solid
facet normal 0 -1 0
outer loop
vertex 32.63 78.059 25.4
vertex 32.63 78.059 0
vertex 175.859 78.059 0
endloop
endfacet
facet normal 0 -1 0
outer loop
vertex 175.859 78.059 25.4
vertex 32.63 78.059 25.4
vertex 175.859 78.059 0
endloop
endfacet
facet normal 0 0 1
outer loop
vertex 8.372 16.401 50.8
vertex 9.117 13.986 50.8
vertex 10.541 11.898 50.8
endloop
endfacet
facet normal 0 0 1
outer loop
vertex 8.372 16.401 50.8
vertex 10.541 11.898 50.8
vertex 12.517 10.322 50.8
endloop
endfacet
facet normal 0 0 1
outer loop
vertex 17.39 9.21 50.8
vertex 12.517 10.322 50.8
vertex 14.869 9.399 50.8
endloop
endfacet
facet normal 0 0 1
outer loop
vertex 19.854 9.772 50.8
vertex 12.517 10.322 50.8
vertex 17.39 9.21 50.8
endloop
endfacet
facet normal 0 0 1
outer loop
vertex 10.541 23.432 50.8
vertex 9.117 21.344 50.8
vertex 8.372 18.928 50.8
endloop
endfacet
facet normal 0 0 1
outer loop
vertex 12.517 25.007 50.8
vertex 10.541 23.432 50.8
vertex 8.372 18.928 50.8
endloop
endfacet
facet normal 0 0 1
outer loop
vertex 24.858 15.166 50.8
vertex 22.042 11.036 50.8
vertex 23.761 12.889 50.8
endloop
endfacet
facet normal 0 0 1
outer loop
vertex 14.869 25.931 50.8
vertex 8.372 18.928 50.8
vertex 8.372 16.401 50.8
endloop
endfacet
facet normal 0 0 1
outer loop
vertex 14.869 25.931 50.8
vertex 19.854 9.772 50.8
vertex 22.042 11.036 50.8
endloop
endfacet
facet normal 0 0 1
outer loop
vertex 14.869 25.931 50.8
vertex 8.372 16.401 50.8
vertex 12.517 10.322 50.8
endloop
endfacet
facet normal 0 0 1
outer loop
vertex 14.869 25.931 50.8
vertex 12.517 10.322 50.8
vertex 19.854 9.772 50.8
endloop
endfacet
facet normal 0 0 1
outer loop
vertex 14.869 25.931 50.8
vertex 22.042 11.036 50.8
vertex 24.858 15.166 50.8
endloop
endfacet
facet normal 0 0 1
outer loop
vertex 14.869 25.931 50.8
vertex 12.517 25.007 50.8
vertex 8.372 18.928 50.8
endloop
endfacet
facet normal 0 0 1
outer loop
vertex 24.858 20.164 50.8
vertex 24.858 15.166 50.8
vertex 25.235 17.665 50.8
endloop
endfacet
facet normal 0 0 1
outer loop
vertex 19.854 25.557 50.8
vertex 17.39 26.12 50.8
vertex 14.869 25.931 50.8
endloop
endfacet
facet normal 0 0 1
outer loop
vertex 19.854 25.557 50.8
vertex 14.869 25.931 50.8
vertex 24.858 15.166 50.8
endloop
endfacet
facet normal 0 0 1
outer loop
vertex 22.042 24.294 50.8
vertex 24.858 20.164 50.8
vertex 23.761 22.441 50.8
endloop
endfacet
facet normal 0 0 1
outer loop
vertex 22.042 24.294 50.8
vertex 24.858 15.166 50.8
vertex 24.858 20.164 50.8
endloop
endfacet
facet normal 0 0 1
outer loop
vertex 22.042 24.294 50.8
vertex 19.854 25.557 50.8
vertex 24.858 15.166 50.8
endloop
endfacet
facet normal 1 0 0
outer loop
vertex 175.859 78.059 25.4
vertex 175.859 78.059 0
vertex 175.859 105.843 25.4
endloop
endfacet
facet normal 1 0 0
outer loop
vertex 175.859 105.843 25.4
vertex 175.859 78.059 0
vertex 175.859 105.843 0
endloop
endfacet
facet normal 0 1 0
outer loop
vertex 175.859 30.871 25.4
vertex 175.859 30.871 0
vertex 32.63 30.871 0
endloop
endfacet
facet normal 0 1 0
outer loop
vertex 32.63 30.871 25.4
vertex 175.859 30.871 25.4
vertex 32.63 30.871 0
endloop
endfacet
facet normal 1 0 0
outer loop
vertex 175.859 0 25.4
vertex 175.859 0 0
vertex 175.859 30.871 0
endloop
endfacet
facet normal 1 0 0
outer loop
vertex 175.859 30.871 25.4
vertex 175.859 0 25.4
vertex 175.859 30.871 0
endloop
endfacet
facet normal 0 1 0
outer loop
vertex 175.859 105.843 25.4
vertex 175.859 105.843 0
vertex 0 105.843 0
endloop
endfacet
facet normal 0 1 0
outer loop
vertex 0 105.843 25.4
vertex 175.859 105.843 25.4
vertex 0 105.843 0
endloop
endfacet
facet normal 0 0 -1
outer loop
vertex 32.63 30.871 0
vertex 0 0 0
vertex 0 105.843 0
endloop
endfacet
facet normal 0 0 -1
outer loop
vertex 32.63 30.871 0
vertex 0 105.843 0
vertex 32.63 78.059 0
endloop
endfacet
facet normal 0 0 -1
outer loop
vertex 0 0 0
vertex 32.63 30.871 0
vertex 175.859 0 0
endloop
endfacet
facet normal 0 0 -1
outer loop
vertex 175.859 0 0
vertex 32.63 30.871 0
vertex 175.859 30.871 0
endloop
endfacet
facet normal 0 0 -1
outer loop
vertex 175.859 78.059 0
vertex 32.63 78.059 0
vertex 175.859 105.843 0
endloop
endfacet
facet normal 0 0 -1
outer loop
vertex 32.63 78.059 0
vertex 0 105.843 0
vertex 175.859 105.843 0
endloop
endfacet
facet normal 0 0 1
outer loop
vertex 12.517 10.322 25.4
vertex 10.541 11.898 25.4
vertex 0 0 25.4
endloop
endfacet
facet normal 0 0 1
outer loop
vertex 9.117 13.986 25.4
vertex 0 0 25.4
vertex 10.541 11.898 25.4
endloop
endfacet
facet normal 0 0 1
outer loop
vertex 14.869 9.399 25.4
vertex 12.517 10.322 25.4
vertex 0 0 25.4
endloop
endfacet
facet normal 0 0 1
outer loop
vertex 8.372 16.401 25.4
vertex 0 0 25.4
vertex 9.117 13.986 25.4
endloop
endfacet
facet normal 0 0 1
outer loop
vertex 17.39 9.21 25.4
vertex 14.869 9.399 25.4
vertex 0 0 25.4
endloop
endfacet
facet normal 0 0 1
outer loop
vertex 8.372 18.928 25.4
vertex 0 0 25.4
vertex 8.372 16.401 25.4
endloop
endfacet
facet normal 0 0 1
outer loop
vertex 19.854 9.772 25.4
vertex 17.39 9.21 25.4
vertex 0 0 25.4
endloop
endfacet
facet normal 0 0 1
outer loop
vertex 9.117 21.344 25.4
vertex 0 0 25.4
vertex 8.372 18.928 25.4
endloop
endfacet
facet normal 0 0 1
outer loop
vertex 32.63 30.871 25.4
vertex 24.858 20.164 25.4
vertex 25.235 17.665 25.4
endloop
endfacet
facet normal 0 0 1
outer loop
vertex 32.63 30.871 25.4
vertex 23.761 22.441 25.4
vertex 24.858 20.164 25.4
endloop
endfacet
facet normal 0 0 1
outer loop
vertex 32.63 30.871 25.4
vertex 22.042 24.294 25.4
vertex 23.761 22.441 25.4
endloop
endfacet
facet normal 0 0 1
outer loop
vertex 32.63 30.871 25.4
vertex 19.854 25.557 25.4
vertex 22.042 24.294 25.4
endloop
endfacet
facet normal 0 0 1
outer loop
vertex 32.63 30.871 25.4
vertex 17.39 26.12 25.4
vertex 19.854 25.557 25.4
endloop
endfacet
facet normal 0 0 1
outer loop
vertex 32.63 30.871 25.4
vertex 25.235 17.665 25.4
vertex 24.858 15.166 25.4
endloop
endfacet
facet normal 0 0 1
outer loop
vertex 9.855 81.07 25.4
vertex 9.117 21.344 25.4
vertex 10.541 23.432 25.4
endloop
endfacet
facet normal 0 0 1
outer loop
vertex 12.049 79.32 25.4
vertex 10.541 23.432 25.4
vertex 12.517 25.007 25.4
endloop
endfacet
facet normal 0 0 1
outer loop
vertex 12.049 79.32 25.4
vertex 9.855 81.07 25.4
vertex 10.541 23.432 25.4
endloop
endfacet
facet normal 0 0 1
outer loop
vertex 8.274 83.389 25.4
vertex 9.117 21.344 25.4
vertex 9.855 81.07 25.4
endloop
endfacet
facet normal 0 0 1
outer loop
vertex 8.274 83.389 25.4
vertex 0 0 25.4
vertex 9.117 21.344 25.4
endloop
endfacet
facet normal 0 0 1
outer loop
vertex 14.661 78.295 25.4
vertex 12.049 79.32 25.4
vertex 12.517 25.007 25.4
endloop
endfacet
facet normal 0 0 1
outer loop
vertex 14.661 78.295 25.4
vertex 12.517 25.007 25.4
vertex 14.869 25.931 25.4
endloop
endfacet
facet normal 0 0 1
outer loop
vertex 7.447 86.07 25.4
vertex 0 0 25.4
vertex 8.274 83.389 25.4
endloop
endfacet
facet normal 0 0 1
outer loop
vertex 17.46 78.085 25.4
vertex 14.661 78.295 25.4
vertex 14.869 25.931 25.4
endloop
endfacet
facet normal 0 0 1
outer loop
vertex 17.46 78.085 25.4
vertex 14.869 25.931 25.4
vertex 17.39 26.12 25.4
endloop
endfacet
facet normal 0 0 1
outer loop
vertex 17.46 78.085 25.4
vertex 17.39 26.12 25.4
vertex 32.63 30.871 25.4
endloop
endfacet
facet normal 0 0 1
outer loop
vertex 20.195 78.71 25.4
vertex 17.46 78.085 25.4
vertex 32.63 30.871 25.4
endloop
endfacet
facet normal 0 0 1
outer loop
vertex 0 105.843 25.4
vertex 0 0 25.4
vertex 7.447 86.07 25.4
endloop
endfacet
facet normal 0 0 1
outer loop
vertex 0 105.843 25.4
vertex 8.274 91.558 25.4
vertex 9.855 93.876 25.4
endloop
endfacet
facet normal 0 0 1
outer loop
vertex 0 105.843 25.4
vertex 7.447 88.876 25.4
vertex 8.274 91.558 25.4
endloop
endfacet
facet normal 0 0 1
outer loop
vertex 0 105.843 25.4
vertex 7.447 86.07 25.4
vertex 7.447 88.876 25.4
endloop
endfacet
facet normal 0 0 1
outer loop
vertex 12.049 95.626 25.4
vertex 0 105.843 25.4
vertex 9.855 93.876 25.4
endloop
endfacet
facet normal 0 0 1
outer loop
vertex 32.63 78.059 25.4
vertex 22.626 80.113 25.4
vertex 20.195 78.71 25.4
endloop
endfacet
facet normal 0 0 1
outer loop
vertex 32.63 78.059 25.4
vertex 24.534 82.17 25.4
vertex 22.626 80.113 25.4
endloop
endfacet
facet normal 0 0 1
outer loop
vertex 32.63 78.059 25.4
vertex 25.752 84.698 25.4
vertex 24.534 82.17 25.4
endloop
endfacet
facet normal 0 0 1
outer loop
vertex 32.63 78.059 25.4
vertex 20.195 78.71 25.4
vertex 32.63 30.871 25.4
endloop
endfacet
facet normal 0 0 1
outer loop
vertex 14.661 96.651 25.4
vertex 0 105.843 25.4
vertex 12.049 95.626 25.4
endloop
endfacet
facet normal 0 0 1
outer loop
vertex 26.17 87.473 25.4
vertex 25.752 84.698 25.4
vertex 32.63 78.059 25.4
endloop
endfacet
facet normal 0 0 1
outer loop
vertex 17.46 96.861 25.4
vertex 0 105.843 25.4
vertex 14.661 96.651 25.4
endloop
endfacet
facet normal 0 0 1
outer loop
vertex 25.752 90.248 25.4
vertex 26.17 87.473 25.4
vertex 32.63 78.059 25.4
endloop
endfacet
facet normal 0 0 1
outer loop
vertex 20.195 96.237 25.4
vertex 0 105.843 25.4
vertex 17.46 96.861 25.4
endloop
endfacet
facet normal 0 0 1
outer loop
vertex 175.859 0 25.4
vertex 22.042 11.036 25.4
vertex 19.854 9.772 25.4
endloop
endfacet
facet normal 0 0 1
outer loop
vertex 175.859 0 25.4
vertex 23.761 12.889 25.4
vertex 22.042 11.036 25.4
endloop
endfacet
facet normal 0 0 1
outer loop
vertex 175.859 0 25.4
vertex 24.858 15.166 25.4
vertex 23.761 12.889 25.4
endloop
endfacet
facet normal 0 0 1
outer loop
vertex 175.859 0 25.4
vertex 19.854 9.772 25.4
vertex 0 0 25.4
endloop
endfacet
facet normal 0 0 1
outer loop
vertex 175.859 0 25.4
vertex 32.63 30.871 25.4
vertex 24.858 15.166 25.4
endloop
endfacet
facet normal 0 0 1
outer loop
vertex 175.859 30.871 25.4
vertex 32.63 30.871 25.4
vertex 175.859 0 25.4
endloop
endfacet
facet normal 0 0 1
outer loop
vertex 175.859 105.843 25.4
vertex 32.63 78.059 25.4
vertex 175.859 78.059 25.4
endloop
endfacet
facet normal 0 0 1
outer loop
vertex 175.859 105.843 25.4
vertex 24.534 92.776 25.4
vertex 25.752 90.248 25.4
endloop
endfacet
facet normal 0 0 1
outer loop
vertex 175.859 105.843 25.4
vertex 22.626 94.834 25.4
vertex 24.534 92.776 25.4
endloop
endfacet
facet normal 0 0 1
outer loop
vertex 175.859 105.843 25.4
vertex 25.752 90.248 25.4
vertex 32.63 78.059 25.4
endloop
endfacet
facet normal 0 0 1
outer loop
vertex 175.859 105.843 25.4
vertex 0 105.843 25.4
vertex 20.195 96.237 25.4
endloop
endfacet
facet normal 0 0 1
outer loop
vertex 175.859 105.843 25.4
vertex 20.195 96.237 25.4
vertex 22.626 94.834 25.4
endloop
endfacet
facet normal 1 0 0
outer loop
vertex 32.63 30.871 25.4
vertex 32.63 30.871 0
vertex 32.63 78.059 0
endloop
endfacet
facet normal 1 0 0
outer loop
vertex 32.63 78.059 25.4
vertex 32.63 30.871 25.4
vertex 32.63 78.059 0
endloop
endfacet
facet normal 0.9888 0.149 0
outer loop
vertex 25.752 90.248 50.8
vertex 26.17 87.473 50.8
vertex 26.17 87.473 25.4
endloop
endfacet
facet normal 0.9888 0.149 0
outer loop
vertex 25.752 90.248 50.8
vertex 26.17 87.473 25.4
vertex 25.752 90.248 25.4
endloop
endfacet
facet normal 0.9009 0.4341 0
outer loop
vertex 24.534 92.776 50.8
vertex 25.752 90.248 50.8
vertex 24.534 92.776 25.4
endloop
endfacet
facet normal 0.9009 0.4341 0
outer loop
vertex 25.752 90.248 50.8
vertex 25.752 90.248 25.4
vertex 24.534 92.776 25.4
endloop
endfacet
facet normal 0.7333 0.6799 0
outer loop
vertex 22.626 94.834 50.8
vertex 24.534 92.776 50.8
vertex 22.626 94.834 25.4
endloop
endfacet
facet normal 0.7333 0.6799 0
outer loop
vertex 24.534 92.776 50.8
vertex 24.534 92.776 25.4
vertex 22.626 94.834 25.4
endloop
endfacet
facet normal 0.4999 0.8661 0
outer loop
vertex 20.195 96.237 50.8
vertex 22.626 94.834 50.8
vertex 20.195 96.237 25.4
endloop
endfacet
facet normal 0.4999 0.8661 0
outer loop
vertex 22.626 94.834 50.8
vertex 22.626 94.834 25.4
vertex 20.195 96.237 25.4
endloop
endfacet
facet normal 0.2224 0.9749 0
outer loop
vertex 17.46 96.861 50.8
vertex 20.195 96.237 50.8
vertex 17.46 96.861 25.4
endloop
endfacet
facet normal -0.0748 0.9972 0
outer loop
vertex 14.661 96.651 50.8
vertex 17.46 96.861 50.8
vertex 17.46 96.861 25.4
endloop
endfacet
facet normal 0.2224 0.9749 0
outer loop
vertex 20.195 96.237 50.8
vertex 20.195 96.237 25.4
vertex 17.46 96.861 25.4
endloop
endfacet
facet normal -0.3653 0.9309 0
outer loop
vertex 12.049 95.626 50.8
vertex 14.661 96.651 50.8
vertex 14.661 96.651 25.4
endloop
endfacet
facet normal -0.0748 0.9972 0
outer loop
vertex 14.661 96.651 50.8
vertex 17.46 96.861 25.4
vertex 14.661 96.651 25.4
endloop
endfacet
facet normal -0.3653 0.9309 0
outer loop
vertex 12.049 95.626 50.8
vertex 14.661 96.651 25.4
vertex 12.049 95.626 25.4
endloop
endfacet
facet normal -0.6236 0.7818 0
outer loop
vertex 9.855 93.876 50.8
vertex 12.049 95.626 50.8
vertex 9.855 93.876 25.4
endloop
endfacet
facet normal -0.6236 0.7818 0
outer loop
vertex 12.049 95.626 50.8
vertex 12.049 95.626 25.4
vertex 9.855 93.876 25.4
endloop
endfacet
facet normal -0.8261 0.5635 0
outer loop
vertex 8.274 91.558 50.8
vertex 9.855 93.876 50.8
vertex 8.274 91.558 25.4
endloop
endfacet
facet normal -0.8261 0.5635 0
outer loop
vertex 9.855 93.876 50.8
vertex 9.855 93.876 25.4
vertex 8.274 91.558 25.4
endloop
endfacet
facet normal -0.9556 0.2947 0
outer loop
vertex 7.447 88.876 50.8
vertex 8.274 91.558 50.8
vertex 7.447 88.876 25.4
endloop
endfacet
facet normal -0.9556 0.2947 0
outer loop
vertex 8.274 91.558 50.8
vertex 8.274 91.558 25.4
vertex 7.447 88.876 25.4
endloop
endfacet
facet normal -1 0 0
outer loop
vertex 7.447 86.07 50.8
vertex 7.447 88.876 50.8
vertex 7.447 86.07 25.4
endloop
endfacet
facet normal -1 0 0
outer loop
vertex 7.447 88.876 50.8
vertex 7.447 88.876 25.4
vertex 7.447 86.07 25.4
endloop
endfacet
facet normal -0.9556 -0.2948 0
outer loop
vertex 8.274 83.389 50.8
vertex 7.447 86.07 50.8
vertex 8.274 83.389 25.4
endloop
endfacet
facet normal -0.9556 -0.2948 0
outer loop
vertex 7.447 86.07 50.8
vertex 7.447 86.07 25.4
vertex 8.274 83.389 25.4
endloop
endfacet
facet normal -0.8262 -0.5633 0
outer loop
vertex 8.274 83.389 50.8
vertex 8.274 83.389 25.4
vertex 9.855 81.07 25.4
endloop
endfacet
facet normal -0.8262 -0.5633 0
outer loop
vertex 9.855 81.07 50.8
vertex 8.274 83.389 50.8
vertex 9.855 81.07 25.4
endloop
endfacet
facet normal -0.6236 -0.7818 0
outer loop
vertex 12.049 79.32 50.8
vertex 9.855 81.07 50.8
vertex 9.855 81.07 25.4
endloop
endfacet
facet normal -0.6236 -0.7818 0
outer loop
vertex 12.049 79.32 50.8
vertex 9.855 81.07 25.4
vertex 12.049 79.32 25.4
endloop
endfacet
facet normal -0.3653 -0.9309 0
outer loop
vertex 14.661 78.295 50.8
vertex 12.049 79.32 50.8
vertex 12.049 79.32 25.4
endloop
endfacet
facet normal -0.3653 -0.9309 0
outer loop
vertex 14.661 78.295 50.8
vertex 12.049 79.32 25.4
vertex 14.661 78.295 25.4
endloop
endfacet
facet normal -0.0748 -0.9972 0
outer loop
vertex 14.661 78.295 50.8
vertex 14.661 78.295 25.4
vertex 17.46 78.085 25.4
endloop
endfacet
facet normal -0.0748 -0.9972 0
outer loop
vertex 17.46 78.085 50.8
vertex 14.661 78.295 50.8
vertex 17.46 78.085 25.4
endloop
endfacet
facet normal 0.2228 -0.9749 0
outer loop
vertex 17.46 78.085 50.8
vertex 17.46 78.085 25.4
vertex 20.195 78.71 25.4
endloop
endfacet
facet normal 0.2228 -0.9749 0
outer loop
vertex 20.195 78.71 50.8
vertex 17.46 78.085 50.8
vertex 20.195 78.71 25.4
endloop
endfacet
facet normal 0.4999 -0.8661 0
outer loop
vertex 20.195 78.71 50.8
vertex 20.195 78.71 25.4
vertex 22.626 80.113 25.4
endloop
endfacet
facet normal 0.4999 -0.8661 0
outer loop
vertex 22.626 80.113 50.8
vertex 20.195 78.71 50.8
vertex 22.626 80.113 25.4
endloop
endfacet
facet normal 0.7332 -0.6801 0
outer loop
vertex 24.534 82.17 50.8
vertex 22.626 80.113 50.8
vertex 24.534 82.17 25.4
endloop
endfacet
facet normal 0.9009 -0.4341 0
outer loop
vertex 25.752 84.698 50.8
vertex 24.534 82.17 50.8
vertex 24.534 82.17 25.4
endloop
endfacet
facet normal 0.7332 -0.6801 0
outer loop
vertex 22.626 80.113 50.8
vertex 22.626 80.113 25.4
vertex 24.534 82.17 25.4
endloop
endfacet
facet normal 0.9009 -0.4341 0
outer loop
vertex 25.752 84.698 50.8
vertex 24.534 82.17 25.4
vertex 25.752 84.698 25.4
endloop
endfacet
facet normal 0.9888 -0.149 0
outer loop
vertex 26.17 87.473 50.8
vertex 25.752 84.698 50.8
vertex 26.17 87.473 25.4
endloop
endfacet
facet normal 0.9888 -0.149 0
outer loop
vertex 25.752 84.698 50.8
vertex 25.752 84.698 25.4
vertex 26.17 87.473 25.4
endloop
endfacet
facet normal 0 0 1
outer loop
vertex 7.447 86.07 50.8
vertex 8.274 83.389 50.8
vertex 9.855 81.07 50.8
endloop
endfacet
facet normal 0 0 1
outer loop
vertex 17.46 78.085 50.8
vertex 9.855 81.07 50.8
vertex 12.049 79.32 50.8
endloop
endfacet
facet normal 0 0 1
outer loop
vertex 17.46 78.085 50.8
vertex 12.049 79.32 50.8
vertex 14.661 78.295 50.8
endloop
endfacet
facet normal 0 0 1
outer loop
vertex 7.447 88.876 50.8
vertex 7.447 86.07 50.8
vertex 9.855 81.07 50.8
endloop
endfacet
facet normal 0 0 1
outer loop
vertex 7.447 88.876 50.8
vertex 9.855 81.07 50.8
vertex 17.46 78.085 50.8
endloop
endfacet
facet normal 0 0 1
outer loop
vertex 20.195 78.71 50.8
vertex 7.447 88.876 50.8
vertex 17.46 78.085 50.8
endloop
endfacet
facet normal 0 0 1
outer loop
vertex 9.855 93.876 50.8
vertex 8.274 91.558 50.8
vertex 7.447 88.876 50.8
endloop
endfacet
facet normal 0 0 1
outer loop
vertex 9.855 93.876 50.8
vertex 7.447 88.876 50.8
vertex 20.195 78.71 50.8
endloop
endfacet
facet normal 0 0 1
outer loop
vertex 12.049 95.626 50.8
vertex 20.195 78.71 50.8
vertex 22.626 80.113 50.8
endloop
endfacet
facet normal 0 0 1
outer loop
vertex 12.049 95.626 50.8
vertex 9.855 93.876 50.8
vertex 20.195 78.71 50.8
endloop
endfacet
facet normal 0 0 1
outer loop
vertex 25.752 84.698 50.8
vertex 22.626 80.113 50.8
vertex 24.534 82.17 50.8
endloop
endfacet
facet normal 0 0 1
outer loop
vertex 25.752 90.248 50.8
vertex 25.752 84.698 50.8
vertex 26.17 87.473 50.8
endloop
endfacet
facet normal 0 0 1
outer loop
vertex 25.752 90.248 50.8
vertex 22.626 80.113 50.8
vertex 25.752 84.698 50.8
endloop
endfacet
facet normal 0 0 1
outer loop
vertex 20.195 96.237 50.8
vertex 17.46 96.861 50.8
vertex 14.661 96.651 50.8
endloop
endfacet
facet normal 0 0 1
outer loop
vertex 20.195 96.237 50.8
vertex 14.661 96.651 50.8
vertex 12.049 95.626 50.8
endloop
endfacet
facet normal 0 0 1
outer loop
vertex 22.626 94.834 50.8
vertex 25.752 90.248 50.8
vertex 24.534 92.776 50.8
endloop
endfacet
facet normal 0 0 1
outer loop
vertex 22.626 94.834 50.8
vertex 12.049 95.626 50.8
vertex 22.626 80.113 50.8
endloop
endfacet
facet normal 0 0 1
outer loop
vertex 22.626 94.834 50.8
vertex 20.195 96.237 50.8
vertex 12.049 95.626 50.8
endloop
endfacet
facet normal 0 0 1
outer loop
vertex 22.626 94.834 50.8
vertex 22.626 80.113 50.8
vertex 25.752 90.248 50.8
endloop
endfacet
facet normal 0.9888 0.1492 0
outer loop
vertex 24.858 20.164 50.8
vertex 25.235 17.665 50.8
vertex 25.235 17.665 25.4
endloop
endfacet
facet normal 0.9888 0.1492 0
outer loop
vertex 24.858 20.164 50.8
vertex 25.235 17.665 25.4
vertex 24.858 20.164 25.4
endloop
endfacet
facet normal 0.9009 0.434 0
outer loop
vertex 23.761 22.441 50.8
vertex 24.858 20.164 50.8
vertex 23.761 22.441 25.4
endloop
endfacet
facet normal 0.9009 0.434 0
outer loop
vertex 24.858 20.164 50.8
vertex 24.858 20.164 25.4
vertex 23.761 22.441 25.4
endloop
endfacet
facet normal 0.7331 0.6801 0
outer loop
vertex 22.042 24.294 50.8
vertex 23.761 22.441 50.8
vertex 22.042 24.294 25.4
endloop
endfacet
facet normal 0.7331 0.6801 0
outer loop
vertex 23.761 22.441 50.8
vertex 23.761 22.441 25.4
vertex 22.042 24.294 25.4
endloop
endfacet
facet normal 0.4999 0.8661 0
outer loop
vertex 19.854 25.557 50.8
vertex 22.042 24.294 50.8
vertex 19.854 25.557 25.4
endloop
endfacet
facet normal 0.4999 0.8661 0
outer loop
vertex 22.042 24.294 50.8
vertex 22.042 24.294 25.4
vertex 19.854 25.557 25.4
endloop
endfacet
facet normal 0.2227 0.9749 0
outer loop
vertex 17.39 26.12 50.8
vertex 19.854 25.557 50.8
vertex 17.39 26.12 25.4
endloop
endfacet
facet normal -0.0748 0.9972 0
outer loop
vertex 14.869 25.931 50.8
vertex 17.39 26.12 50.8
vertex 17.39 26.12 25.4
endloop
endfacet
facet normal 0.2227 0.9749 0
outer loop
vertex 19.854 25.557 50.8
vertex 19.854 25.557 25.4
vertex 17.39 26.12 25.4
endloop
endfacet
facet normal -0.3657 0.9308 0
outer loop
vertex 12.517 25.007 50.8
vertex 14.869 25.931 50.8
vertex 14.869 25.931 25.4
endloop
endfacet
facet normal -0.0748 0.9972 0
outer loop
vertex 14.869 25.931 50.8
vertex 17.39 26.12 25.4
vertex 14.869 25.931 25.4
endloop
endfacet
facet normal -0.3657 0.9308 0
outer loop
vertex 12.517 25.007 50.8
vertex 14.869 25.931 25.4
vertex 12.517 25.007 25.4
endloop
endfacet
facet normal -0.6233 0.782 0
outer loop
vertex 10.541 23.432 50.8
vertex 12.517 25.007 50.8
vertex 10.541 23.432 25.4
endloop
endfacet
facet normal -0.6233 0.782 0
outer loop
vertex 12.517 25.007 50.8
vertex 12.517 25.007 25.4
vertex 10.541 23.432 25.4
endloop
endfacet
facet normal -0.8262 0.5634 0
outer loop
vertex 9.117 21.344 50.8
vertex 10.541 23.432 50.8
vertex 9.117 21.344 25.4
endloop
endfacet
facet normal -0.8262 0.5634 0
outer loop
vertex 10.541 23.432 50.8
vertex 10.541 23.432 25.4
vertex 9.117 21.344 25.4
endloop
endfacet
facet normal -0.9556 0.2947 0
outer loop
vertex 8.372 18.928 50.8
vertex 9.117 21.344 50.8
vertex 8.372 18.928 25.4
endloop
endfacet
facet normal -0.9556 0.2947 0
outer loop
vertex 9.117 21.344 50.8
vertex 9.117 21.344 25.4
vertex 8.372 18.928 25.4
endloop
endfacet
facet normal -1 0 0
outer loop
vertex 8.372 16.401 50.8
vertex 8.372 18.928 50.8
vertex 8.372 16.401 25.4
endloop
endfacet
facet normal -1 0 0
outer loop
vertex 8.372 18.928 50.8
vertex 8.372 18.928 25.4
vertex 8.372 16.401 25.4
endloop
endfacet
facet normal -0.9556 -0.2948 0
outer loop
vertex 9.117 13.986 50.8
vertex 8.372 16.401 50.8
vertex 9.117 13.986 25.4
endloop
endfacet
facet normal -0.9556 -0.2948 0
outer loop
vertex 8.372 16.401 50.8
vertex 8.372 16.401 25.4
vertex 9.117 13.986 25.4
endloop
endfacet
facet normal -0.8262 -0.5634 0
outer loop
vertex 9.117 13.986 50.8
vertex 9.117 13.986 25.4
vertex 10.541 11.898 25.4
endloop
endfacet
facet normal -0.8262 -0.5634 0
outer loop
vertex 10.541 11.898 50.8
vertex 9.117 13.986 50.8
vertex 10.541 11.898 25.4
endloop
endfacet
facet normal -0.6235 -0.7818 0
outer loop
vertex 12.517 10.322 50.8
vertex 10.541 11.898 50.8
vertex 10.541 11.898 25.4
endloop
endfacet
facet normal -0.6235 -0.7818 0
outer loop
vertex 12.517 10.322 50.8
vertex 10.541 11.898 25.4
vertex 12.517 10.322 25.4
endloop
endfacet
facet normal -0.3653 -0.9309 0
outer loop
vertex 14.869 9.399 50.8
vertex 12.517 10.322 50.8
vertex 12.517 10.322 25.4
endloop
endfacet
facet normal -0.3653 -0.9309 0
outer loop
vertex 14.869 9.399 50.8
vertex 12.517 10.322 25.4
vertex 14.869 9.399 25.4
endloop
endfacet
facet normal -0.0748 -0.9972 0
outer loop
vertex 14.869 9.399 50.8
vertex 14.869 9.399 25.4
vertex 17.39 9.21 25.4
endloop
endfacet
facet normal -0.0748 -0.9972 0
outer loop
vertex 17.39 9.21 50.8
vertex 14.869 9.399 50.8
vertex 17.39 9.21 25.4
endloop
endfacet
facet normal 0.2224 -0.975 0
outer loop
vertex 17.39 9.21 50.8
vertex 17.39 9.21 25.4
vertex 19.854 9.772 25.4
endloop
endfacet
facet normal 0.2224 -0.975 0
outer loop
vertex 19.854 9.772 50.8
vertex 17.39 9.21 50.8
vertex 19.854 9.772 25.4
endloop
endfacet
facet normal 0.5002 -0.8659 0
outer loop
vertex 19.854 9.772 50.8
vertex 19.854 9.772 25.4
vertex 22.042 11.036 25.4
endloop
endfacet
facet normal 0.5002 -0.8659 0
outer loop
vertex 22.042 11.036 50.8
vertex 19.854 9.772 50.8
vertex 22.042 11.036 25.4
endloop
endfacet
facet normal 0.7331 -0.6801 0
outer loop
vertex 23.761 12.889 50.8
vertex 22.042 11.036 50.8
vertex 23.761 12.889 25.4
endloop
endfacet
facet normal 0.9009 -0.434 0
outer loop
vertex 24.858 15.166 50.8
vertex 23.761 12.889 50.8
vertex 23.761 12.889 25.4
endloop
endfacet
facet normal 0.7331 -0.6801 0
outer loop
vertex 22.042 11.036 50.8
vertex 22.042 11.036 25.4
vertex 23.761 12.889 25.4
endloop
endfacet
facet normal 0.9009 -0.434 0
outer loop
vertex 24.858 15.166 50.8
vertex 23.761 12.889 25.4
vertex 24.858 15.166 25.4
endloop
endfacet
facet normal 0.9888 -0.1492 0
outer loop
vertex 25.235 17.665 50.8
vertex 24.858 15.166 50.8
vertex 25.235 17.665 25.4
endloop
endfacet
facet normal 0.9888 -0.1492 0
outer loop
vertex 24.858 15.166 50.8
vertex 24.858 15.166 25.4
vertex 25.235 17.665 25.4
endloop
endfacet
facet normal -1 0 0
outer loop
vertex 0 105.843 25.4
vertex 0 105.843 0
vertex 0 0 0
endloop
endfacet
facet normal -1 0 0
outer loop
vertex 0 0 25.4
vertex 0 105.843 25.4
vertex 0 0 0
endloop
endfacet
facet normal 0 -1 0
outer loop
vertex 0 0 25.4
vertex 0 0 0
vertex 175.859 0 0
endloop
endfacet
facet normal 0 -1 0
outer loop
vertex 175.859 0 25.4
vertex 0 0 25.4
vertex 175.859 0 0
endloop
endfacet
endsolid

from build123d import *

# Parameters (mm, degrees)
F1_DEPTH = 25.4
F2_R     = 9.414196
F2_R_2   = 8.478638
F3_DEPTH = 25.4


with BuildPart() as f1:
    # F0 (on Top) → F1 (new body)
    with BuildSketch(Plane.XY):
        Polygon((0, 105.842702), (0, 0), (175.859332, 0), (175.859332, 30.87078), (32.630205, 30.87078), (32.630205, 78.058995), (175.859332, 78.058995), (175.859332, 105.842702), align=None)
    extrude(amount=F1_DEPTH)

    # F2 (on face) → F3 (join)
    with BuildSketch(Plane.XY.offset(25.4)):
        with Locations((16.756006, 87.473191)):
            Circle(F2_R)
        with Locations((16.756006, 17.66476)):
            Circle(F2_R_2)
    extrude(amount=F3_DEPTH)


solid = f1.part
